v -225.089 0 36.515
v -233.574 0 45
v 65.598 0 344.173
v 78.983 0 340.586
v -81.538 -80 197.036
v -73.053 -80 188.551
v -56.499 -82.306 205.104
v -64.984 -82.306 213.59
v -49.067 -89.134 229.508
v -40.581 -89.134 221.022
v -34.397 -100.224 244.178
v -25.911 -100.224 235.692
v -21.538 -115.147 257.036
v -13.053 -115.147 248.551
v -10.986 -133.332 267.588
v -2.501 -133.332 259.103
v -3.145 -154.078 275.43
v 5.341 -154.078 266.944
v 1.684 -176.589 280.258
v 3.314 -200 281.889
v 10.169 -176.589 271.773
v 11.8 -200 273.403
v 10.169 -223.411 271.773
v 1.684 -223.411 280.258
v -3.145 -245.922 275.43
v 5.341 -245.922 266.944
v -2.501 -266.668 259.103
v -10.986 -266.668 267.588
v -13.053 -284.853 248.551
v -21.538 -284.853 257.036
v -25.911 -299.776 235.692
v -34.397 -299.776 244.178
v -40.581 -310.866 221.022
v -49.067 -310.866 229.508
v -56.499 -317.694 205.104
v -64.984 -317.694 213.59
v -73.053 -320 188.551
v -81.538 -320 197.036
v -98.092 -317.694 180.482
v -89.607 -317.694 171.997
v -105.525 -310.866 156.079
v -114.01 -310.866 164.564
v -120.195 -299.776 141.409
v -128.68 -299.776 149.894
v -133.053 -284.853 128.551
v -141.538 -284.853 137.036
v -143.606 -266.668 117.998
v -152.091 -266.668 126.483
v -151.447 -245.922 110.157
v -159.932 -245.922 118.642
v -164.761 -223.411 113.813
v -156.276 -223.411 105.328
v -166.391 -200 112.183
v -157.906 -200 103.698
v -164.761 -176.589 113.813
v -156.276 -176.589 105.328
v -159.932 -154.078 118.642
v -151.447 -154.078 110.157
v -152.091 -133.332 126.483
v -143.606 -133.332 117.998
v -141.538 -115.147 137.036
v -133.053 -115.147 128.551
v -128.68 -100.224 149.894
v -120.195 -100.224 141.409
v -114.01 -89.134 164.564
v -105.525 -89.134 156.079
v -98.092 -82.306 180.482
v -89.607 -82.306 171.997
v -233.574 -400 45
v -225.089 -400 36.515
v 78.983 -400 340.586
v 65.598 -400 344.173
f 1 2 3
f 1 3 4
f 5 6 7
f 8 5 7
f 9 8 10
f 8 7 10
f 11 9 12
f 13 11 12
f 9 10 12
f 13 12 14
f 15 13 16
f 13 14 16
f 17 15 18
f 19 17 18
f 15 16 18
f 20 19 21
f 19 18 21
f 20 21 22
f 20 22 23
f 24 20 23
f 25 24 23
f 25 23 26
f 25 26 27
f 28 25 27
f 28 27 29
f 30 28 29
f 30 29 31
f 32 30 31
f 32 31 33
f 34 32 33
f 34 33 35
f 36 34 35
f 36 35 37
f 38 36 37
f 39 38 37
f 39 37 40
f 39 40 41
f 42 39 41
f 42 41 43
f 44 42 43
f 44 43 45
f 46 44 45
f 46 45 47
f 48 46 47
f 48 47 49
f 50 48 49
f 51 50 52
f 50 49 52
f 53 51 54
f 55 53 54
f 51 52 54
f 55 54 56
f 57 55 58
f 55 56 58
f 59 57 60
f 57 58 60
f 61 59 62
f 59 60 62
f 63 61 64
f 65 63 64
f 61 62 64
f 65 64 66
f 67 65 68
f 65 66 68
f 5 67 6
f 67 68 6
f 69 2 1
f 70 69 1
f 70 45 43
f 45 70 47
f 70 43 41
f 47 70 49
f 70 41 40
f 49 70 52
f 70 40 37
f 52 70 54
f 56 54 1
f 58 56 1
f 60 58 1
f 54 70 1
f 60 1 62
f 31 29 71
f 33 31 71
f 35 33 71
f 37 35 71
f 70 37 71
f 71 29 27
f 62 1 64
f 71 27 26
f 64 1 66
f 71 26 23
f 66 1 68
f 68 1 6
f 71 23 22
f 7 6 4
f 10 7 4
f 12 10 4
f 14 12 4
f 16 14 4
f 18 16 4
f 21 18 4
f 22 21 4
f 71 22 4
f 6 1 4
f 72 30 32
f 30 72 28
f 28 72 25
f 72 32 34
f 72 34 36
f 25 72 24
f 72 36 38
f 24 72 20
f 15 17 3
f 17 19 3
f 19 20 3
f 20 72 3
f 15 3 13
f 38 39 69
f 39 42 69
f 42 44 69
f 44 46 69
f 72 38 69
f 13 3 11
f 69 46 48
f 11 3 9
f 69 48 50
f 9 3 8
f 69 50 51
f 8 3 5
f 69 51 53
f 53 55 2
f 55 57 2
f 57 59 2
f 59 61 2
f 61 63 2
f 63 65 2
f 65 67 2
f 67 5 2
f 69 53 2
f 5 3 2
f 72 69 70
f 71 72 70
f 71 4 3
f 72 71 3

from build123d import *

# Parameters (mm, degrees)
F1_DEPTH = 400
F3_DEPTH = 25


with BuildPart() as f1:
    # F0 (on Front) → F1 (new body)
    with BuildSketch(Plane.XZ):
        Polygon((-225.0889671236, 36.5147186258), (78.9826564552, 340.5863422045), (65.5983955954, 344.1726440932), (-233.5742484978, 45), align=None)
    extrude(amount=F1_DEPTH)

    # F2 (on face) → F3 (cut)
    with BuildSketch(Plane(origin=(-130.8018428747, 0, 130.8018428747), x_dir=(0, 1, 0), z_dir=(0.7071067812, 0, -0.7071067812))):
        with BuildLine():
            ThreePointArc((-320, 81.668977129), (-200, -38.331022871), (-80, 81.668977129))
            Line((-80, 81.668977129), (-320, 81.668977129))
        make_face()
        with BuildLine():
            Line((-320, 81.668977129), (-80, 81.668977129))
            ThreePointArc((-80, 81.668977129), (-200, 201.668977129), (-320, 81.668977129))
        make_face()
    extrude(amount=-F3_DEPTH, mode=Mode.SUBTRACT)


solid = f1.part
